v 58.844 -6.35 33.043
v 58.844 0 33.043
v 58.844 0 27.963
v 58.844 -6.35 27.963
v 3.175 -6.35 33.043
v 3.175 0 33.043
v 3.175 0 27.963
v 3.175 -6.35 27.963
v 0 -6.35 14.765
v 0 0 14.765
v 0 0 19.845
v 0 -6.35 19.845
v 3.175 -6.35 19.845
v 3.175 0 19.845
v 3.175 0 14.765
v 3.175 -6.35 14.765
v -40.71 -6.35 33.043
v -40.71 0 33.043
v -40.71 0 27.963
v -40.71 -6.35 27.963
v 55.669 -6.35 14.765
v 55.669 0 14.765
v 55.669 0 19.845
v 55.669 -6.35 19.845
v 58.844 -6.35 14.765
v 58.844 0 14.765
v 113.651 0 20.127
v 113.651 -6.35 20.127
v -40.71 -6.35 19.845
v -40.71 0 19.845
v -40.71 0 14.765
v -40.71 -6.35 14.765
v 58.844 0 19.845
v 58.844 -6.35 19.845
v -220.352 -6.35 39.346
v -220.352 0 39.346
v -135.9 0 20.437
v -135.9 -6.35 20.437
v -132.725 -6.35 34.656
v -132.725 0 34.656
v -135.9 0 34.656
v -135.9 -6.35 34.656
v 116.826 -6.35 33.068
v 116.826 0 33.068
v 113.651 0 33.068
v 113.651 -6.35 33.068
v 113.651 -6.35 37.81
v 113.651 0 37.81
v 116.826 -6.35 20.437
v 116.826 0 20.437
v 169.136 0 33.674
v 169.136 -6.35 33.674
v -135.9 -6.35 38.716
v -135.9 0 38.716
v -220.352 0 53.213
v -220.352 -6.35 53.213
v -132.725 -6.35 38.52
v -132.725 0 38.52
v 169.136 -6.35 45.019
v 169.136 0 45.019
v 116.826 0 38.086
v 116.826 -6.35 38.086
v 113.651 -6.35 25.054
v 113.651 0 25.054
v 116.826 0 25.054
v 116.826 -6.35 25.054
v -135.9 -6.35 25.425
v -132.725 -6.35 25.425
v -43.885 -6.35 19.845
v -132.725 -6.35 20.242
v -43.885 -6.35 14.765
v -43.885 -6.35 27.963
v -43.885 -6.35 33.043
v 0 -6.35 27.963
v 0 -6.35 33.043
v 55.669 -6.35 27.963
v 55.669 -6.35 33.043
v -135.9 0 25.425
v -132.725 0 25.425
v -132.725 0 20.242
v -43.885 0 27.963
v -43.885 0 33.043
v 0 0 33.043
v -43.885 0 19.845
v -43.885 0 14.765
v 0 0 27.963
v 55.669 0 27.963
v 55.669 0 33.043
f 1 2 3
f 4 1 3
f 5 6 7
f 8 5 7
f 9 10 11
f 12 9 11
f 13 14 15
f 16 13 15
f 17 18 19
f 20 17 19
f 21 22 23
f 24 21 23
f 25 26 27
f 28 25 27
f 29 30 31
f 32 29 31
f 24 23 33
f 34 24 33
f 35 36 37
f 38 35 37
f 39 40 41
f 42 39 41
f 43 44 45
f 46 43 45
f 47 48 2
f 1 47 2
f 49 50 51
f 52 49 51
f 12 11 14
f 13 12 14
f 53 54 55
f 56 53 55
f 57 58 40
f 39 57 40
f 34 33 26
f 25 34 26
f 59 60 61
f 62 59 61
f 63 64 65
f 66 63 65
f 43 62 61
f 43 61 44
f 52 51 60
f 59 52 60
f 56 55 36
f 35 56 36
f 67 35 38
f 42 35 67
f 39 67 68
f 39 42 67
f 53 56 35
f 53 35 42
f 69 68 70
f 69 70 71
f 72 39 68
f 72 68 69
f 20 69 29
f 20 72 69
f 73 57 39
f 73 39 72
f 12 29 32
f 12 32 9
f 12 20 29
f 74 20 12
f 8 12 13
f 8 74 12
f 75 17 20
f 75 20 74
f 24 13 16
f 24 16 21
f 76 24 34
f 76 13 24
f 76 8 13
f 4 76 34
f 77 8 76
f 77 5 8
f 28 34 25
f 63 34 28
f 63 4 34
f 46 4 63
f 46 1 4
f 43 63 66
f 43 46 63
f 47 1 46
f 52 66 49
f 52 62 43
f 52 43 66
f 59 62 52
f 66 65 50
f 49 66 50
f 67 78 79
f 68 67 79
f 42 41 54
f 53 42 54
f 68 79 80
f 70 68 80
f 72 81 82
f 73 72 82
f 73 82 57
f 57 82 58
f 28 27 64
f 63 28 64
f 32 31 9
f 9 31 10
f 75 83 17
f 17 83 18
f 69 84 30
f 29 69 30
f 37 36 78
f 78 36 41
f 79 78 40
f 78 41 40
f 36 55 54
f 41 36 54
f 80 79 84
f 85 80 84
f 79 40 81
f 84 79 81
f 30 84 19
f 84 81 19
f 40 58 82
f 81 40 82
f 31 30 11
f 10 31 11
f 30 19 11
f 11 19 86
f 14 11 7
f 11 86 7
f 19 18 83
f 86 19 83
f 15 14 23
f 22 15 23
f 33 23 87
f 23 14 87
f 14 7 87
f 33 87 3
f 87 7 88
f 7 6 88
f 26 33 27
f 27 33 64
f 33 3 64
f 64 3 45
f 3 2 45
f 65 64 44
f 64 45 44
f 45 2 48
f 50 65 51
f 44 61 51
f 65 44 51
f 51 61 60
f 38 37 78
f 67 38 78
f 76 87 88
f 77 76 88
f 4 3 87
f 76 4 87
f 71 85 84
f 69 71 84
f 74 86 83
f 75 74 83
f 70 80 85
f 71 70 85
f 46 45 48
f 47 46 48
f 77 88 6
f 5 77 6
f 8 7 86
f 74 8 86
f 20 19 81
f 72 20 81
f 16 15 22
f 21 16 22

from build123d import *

# Parameters (mm, degrees)
F1_DEPTH = 6.35


with BuildPart() as f1:
    # F0 (on Front) → F1 (new body)
    with BuildSketch(Plane.XZ):
        Polygon((-135.90005, 38.716007), (-220.352262, 53.212889), (-220.352262, 39.346308), (-135.90005, 20.437343), (-135.90005, 25.42473), (-132.72505, 25.42473), (-132.72505, 20.241606), (-43.884959, 14.764653), (-43.884959, 19.270245), (-43.884959, 19.844653), (-40.709959, 19.844653), (-40.709959, 19.270245), (-40.709959, 14.764653), (0, 14.764653), (0, 19.844653), (3.175, 19.844653), (3.175, 14.764653), (55.669224, 14.764653), (55.669224, 19.844653), (58.844224, 19.844653), (58.844224, 14.764653), (113.651348, 20.126716), (113.651348, 25.054362), (116.826348, 25.054362), (116.826348, 20.437343), (169.136286, 33.673622), (169.136286, 45.019001), (116.826348, 38.08571), (116.826348, 33.067703), (113.651348, 33.067703), (113.651348, 37.809598), (58.844224, 33.043321), (58.844224, 27.963321), (55.669224, 27.963321), (55.669224, 33.043321), (3.175, 33.043321), (3.175, 27.963321), (0, 27.963321), (0, 33.043321), (-40.709959, 33.043321), (-40.709959, 27.963321), (-43.884959, 27.963321), (-43.884959, 33.043321), (-132.72505, 38.52027), (-132.72505, 34.656454), (-135.90005, 34.656454), align=None)
    extrude(amount=F1_DEPTH)


solid = f1.part
